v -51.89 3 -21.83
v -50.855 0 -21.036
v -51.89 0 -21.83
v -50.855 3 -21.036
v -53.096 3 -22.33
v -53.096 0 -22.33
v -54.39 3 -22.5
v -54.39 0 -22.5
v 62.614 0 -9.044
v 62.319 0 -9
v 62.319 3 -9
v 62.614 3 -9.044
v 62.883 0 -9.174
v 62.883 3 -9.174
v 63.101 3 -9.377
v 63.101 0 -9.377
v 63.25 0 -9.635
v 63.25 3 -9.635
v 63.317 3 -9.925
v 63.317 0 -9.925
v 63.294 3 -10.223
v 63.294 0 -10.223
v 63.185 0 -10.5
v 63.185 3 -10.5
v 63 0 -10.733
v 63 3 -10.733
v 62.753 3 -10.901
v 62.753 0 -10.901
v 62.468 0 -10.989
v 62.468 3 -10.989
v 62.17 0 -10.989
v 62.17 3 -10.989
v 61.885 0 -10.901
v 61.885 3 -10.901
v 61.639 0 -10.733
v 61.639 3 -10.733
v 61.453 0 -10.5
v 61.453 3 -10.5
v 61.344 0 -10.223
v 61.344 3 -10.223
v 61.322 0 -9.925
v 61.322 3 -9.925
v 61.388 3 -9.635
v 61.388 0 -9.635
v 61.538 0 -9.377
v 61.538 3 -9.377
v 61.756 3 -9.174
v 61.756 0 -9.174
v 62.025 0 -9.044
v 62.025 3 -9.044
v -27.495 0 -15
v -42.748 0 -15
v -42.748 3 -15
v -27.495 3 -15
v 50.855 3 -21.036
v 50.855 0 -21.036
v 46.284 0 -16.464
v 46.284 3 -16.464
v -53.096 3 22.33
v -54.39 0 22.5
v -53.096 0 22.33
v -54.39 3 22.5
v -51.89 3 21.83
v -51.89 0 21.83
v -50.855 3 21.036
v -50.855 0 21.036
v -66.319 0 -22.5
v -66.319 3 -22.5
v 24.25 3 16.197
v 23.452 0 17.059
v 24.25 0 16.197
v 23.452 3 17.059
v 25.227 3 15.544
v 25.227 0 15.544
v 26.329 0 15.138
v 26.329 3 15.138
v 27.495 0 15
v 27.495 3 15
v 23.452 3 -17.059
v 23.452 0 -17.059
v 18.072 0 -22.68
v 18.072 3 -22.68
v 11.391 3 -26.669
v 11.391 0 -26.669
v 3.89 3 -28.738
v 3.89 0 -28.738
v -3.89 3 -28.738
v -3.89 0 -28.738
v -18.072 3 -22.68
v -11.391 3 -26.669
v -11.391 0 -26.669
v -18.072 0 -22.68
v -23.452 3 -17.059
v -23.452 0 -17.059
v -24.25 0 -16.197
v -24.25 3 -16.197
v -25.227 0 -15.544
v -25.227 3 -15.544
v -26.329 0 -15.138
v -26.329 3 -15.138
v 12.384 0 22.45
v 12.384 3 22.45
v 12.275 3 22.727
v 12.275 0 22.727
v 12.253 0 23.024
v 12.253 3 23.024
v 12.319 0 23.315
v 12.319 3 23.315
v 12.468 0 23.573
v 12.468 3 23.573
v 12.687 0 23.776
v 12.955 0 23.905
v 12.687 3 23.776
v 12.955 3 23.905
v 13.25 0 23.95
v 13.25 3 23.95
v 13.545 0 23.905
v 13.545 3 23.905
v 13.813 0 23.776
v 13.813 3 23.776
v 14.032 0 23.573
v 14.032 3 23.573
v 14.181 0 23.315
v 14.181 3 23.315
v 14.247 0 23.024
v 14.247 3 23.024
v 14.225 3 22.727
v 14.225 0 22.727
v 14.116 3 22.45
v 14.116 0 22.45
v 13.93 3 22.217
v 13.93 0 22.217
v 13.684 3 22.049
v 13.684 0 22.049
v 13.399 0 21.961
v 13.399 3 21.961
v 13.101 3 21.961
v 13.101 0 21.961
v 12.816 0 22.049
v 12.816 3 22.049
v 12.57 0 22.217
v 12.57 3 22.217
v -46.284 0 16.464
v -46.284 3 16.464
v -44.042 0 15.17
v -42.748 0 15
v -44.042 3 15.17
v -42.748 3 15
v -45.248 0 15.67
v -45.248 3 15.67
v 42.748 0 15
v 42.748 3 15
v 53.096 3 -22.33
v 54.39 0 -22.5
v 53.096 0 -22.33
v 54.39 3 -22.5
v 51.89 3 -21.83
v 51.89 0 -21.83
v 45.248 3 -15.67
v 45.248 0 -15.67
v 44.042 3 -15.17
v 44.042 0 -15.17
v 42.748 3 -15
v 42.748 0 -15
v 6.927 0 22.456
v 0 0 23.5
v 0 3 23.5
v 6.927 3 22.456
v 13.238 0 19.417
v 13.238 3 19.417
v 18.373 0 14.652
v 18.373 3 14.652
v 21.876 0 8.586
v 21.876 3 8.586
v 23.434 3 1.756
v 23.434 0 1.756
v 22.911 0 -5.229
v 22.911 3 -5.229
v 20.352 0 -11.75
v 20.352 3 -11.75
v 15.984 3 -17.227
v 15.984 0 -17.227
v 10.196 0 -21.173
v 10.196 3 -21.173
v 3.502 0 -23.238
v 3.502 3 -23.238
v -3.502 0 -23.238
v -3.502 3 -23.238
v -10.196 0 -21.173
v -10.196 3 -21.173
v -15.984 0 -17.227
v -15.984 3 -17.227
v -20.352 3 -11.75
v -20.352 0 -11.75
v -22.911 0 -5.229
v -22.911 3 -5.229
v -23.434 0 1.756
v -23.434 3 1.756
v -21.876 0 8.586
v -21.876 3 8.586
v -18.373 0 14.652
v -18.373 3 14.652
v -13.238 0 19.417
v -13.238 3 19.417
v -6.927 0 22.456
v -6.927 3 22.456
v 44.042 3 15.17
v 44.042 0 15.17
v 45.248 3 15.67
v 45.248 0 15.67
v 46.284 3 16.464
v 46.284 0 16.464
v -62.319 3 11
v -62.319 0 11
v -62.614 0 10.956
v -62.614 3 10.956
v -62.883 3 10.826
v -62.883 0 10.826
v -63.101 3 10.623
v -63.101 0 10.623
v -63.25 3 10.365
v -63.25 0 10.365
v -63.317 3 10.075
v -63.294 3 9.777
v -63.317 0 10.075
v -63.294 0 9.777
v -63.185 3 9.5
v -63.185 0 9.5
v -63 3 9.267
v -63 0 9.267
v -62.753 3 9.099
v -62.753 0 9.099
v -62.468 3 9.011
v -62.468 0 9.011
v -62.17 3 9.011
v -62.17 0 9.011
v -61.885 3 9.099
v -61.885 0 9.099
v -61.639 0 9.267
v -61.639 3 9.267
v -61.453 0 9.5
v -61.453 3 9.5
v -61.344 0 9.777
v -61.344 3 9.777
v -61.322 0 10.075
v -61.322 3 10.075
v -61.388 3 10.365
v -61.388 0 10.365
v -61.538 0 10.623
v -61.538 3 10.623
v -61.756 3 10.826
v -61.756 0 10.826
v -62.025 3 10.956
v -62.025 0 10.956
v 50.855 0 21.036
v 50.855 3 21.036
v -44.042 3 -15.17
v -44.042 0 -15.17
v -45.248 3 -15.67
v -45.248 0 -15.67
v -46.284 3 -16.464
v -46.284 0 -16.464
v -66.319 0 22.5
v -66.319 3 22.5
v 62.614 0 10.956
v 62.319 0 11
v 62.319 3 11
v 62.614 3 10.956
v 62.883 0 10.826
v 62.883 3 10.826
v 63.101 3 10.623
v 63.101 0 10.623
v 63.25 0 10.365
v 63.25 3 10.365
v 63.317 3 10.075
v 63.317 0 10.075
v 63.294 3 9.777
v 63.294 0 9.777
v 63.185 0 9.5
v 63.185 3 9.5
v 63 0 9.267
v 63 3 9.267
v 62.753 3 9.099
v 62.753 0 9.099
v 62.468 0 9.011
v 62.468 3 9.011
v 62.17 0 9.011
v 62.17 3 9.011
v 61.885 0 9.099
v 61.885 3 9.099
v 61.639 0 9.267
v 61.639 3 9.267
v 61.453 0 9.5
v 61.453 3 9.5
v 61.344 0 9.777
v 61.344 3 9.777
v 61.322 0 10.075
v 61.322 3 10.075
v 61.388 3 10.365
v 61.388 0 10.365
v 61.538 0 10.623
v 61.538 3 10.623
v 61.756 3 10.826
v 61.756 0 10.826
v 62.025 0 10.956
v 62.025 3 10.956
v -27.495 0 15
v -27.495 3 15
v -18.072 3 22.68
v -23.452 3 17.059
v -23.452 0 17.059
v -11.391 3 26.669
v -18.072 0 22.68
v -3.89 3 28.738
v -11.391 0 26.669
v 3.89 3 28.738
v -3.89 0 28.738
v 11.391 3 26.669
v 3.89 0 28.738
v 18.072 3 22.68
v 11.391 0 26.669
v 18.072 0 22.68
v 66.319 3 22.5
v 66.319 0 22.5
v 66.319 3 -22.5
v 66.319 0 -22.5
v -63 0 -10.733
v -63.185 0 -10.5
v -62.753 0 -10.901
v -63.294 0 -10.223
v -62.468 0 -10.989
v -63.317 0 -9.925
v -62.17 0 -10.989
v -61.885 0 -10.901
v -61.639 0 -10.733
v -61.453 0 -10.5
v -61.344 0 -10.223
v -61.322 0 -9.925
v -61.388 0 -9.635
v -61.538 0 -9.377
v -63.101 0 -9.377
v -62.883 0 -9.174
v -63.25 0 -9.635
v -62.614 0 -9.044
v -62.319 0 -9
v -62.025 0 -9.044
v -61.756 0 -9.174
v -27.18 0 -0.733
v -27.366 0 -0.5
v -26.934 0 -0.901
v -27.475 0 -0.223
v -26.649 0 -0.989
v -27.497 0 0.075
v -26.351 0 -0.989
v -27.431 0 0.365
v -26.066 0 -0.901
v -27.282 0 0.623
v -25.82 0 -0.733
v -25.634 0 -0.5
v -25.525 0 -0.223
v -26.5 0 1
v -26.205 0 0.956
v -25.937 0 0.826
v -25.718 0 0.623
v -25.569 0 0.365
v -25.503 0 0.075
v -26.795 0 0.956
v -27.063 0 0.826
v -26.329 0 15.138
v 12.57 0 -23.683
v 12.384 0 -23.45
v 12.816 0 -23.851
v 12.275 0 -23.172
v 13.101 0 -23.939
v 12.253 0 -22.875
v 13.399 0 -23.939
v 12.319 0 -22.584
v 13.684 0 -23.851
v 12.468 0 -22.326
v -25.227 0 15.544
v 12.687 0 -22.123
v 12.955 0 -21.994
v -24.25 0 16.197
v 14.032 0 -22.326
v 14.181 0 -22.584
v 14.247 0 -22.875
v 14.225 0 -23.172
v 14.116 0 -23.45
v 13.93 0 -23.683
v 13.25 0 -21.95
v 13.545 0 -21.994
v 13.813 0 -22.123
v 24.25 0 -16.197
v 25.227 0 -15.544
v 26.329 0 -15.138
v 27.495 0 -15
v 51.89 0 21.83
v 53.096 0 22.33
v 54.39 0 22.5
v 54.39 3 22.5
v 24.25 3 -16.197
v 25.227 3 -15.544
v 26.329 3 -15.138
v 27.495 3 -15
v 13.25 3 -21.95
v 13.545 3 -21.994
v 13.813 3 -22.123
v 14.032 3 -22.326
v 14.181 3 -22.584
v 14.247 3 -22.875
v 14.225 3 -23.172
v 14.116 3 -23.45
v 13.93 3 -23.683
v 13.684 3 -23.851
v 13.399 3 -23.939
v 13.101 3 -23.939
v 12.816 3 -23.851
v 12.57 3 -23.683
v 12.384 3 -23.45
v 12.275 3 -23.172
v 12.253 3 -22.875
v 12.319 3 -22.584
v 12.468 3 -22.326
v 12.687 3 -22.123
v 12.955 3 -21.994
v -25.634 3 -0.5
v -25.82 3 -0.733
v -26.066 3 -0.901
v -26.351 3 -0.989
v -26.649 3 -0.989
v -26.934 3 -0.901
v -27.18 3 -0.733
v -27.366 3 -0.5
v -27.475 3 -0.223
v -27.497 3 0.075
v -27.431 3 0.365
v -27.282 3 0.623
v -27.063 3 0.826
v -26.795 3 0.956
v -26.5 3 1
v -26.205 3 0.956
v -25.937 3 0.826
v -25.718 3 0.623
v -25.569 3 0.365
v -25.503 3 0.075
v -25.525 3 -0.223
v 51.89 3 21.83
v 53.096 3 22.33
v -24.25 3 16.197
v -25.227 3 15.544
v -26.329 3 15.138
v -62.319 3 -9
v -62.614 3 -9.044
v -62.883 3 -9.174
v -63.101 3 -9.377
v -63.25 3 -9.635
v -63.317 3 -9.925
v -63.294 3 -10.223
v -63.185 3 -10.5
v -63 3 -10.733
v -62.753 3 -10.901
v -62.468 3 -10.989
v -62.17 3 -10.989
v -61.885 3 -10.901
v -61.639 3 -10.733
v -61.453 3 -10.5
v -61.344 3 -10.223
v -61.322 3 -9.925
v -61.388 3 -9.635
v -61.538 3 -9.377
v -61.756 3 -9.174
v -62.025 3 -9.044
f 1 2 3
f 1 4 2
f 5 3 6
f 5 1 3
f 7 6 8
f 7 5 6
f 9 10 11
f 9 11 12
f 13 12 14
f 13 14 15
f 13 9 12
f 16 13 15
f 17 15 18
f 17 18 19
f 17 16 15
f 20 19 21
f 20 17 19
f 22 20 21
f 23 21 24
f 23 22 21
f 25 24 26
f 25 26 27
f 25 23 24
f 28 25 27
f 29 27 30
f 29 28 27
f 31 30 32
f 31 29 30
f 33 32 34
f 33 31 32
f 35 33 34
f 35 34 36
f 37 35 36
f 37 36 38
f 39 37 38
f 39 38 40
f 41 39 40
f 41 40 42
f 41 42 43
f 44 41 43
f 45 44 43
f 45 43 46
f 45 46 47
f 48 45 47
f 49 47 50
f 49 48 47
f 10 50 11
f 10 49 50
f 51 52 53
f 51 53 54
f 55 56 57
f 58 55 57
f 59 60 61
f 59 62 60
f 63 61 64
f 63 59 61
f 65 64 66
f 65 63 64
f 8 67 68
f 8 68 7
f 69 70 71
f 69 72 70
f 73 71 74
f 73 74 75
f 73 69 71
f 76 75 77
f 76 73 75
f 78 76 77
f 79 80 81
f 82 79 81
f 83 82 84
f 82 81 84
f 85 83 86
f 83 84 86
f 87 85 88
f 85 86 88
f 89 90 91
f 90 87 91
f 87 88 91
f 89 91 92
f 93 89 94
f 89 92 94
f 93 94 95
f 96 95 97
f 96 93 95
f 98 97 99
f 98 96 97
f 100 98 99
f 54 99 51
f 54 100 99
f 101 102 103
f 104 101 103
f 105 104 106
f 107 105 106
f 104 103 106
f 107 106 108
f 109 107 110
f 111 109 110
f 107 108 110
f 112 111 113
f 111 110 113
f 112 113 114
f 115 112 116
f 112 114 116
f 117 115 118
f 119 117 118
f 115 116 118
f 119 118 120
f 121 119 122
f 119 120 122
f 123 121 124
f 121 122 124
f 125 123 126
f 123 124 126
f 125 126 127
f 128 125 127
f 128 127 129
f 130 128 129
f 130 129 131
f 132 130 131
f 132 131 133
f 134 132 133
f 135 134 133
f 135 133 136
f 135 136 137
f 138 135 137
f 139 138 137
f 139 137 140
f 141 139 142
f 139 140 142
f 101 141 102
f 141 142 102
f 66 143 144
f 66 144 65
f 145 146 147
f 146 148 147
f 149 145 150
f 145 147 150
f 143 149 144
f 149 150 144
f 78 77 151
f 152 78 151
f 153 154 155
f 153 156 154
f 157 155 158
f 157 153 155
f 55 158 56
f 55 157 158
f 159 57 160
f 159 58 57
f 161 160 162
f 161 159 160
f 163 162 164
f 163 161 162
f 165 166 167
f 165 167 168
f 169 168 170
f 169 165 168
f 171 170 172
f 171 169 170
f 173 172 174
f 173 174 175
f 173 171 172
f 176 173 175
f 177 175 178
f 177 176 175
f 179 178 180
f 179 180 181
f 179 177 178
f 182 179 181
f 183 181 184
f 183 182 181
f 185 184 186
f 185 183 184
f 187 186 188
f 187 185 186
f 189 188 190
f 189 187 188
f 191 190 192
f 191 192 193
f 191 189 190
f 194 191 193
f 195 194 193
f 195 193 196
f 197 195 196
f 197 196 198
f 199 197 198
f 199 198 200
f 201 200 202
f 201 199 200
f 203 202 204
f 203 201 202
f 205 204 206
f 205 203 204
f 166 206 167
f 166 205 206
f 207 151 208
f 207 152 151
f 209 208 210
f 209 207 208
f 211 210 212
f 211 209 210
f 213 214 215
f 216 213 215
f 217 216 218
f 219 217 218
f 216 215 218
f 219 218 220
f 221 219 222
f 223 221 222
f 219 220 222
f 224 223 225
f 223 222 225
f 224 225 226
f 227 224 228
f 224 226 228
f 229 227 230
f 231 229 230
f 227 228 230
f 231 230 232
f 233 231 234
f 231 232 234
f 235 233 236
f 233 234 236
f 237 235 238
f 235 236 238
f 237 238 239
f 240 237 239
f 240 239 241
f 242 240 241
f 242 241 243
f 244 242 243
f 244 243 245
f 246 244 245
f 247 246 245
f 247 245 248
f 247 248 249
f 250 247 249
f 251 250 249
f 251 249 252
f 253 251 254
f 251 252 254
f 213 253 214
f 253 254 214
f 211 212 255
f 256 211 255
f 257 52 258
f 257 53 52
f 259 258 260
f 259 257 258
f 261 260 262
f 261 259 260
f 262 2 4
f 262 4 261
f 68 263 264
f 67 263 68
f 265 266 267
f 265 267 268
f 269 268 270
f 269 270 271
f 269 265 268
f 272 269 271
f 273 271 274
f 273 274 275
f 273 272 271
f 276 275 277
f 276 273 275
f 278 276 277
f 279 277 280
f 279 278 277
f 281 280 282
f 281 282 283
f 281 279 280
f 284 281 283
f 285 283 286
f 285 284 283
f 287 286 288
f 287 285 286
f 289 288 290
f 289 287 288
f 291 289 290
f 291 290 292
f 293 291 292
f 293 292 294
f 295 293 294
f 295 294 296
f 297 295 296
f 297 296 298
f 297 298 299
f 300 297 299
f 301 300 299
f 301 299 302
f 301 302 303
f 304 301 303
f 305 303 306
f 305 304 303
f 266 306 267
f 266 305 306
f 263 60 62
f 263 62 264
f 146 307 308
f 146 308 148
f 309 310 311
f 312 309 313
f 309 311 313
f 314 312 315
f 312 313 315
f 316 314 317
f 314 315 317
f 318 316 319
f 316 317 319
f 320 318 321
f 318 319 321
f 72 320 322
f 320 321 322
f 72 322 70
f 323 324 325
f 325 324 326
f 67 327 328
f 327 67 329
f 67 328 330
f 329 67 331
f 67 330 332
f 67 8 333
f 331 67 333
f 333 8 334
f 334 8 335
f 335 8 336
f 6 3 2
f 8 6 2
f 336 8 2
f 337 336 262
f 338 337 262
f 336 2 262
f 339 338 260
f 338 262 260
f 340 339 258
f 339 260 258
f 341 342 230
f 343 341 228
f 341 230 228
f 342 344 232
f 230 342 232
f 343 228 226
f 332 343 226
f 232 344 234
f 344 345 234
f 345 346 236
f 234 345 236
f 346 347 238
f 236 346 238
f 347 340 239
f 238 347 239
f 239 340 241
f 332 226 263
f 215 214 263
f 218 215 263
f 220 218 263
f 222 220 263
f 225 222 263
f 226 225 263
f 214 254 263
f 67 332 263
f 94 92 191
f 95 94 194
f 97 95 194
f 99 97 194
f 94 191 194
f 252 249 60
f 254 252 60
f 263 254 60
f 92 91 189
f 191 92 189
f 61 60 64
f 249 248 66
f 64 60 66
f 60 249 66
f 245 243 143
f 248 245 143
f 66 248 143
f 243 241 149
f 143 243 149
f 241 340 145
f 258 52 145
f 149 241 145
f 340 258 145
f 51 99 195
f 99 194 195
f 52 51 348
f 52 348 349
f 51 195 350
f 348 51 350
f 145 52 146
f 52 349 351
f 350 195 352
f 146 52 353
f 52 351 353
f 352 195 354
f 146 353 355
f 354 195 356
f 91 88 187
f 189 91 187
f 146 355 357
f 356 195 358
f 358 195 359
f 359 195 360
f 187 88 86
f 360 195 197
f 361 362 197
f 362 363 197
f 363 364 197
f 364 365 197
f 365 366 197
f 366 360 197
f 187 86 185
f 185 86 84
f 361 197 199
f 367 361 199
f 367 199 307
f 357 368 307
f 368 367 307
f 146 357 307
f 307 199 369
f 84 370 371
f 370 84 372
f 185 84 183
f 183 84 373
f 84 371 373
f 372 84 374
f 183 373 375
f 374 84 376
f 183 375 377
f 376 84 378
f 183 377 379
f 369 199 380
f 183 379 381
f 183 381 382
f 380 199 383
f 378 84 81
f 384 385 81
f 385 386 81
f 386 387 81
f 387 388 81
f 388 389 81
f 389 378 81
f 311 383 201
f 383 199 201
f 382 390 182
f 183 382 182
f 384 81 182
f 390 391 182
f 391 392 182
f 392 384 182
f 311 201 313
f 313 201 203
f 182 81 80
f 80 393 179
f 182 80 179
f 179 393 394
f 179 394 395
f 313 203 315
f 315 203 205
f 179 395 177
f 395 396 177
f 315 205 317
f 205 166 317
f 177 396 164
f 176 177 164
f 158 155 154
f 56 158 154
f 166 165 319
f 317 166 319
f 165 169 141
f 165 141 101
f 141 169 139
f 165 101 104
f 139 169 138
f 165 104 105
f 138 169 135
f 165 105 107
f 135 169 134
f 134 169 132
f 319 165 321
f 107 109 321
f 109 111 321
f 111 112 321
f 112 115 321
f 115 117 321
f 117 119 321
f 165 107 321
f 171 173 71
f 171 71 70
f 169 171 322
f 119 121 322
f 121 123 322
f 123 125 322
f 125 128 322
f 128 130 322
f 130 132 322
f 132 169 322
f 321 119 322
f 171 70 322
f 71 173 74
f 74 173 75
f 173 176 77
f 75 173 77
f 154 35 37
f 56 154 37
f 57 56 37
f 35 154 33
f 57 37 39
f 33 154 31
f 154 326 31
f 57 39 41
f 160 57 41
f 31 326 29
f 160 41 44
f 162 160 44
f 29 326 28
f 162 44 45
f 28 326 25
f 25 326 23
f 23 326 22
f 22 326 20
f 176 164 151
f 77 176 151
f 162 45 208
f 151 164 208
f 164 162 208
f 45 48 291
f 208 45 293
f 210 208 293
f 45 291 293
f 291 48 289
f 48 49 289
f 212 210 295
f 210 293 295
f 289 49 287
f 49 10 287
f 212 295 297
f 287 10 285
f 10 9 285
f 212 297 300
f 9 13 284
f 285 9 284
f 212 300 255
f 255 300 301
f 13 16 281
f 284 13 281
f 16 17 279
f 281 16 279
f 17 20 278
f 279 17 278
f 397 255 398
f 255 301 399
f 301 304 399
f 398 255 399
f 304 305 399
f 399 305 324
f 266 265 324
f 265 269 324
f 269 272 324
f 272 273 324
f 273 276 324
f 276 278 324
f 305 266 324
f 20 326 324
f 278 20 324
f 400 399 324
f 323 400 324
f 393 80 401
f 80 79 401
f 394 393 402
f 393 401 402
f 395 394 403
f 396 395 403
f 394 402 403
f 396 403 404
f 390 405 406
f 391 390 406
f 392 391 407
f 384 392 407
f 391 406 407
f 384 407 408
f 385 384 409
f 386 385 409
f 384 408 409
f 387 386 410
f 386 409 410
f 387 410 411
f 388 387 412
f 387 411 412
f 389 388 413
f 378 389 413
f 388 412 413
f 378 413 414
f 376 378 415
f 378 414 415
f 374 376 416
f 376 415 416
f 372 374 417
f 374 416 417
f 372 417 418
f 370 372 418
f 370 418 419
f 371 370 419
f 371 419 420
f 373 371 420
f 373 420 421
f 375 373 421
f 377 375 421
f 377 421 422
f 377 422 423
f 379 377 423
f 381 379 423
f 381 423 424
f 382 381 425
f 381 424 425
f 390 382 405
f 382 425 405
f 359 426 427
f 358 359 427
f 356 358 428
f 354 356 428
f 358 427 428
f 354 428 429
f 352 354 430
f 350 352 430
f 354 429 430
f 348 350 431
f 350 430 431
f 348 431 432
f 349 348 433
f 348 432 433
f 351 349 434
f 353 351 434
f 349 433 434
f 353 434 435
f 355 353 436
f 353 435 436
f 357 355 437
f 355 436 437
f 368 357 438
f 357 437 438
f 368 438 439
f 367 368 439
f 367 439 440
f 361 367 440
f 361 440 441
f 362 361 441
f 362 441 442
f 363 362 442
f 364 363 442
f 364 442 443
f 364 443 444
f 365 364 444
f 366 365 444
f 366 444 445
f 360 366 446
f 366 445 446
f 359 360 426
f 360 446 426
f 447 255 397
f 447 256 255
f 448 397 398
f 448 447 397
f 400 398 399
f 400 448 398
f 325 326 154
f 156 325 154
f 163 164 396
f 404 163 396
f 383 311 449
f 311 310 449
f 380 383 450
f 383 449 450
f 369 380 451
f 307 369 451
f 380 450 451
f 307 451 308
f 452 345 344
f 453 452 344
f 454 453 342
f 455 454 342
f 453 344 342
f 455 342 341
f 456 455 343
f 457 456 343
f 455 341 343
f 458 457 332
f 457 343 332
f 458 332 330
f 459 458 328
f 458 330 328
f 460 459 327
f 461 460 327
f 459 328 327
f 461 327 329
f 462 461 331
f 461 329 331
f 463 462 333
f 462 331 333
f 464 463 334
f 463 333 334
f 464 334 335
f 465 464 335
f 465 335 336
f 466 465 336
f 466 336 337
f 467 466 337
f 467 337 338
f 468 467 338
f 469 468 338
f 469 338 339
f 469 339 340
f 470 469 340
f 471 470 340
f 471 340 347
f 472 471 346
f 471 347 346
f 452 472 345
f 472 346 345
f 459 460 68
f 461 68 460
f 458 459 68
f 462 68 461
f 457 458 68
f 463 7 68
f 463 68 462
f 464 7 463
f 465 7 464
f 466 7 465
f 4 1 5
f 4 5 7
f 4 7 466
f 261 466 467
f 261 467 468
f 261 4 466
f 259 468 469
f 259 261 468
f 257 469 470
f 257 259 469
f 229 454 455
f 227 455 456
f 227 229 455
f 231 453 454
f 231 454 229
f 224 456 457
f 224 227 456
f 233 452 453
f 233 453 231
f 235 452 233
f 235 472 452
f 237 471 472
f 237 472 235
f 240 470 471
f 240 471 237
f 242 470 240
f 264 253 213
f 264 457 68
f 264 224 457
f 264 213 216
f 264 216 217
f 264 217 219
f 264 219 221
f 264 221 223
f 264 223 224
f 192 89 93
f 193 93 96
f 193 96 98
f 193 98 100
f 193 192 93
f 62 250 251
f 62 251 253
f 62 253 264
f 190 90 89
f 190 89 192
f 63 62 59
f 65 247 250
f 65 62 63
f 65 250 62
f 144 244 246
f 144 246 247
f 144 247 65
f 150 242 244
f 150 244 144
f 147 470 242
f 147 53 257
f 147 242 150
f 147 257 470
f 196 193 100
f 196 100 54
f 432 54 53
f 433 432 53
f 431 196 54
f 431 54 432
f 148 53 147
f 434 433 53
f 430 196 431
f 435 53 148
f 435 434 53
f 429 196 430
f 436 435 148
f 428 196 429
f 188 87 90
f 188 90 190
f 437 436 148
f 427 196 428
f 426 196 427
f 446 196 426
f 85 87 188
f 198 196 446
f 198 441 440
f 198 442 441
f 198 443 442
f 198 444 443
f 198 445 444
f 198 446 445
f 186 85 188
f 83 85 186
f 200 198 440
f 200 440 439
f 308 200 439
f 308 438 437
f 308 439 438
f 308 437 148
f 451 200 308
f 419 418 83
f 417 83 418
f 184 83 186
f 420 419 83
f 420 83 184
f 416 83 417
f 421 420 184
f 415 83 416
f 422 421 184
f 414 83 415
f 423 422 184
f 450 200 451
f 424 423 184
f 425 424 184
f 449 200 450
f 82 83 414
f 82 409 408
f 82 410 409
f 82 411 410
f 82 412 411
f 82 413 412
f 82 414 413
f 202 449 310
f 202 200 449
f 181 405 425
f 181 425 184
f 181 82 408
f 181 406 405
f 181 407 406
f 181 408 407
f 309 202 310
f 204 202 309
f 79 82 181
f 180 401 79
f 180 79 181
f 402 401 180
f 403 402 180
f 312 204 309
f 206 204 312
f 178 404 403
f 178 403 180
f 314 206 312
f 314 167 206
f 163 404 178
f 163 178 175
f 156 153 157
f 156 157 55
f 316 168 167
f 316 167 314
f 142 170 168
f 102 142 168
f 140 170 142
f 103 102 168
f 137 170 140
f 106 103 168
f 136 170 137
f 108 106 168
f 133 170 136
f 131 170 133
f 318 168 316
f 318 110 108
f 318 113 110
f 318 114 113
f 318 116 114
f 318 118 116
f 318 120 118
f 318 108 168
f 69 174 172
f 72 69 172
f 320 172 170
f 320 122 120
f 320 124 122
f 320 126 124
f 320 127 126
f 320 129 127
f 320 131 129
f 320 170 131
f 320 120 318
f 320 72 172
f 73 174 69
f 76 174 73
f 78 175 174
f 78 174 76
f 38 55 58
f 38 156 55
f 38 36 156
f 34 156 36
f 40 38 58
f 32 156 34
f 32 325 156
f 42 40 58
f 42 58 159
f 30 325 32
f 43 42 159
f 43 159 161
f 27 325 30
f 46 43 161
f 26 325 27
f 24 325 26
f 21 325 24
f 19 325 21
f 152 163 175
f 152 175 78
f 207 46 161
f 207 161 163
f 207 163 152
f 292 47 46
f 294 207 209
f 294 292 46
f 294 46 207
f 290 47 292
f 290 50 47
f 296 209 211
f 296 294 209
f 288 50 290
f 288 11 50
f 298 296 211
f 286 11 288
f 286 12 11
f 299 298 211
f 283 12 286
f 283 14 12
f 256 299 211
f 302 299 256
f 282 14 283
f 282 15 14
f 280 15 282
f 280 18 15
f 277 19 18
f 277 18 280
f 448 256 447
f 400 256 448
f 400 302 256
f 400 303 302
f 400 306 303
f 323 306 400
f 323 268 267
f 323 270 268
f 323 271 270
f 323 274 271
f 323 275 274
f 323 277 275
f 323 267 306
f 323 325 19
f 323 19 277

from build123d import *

# Parameters (mm, degrees)
SKETCH2_R            = 29
SKETCH2_R_2          = 23.5
BOSS_EXTRUDE1_DEPTH  = 3
SKETCH2_3_R          = 1
BOSS_EXTRUDE2_DEPTH  = 3
FILLET1_R            = 5
SKETCH3_R            = 1
CUT_EXTRUDE1_DEPTH   = 3
CIRPATTERN1_COUNT    = 3
FILLET1_OF_MIRROR1_R = 5


with BuildPart() as part:
    # Sketch2 → Boss-Extrude1 (new body)
    with BuildSketch(Plane(origin=(0, 0, 0), x_dir=(1, 0, 0), z_dir=(0, 1, 0))):
        with Locations(Location((0, 0, 0), (0, 0, 270))):
            Circle(SKETCH2_R)
        with Locations(Location((0, 0, 0), (0, 0, 270))):
            Circle(SKETCH2_R_2, mode=Mode.SUBTRACT)
    extrude(amount=BOSS_EXTRUDE1_DEPTH)

    # Sketch2<3> → Boss-Extrude2 (add)
    with BuildSketch(Plane(origin=(0, 0, 0), x_dir=(1, 0, 0), z_dir=(0, 1, 0))):
        with BuildLine():
            Line((44.819347292, 15), (24.819347292, 15))
            ThreePointArc((24.819347292, 15), (27.935291939, 7.78585026), (29, 0))
            ThreePointArc((29, 0), (27.935291939, -7.78585026), (24.819347292, -15))
            Line((24.819347292, -15), (44.819347292, -15))
            Line((44.819347292, -15), (52.319347292, -22.5))
            Line((52.319347292, -22.5), (66.319347292, -22.5))
            Line((66.319347292, -22.5), (66.319347292, 22.5))
            Line((66.319347292, 22.5), (52.319347292, 22.5))
            Line((52.319347292, 22.5), (44.819347292, 15))
        make_face()
        with Locations(Location((62.319347292, -10, 0), (0, 0, 270))):
            Circle(SKETCH2_3_R, mode=Mode.SUBTRACT)
        with Locations(Location((62.319347292, 10, 0), (0, 0, 270))):
            Circle(SKETCH2_3_R, mode=Mode.SUBTRACT)
    boss_extrude2 = extrude(amount=BOSS_EXTRUDE2_DEPTH)

    # Fillet1
    fillet1_edges = [part.edges().sort_by_distance(p)[0] for p in [
        (44.819347292, 1.5, -15),
        (52.319347292, 1.5, -22.5),
        (52.319347292, 1.5, 22.5),
        (44.819347292, 1.5, 15),
        (24.819347292, 1.5, 15),
        (24.819347292, 1.5, -15),
    ]]
    fillet(fillet1_edges, radius=FILLET1_R)

    # Sketch3 → Cut-Extrude1 (cut)
    with BuildSketch(Plane(origin=(0, 3, 0), x_dir=(1, 0, 0), z_dir=(0, 1, 0))):
        with Locations(Location((13.25, 22.9496732, 0), (0, 0, 270))):
            Circle(SKETCH3_R)
    cut_extrude1 = extrude(amount=-CUT_EXTRUDE1_DEPTH, mode=Mode.SUBTRACT)

    # CirPattern1: Cut-Extrude1 ×3 about axis
    cirpattern1_axis = Axis((0, 0, 0), (0, 1, 0))
    for i in range(1, CIRPATTERN1_COUNT):
        add(cut_extrude1.rotate(cirpattern1_axis, i * 360 / CIRPATTERN1_COUNT), mode=Mode.SUBTRACT)

    # Mirror1: Boss-Extrude2 across plane
    add(boss_extrude2.mirror(Plane(origin=(0, 0, 0), x_dir=(0, 0, 1), z_dir=(1, 0, 0))))

    # Fillet1 of Mirror1
    fillet1_of_mirror1_edges = [part.edges().sort_by_distance(p)[0] for p in [
        (-44.819347292, 1.5, -15),
        (-52.319347292, 1.5, -22.5),
        (-52.319347292, 1.5, 22.5),
        (-44.819347292, 1.5, 15),
        (-24.819347292, 1.5, 15),
        (-24.819347292, 1.5, -15),
    ]]
    fillet(fillet1_of_mirror1_edges, radius=FILLET1_OF_MIRROR1_R)


solid = part.part
